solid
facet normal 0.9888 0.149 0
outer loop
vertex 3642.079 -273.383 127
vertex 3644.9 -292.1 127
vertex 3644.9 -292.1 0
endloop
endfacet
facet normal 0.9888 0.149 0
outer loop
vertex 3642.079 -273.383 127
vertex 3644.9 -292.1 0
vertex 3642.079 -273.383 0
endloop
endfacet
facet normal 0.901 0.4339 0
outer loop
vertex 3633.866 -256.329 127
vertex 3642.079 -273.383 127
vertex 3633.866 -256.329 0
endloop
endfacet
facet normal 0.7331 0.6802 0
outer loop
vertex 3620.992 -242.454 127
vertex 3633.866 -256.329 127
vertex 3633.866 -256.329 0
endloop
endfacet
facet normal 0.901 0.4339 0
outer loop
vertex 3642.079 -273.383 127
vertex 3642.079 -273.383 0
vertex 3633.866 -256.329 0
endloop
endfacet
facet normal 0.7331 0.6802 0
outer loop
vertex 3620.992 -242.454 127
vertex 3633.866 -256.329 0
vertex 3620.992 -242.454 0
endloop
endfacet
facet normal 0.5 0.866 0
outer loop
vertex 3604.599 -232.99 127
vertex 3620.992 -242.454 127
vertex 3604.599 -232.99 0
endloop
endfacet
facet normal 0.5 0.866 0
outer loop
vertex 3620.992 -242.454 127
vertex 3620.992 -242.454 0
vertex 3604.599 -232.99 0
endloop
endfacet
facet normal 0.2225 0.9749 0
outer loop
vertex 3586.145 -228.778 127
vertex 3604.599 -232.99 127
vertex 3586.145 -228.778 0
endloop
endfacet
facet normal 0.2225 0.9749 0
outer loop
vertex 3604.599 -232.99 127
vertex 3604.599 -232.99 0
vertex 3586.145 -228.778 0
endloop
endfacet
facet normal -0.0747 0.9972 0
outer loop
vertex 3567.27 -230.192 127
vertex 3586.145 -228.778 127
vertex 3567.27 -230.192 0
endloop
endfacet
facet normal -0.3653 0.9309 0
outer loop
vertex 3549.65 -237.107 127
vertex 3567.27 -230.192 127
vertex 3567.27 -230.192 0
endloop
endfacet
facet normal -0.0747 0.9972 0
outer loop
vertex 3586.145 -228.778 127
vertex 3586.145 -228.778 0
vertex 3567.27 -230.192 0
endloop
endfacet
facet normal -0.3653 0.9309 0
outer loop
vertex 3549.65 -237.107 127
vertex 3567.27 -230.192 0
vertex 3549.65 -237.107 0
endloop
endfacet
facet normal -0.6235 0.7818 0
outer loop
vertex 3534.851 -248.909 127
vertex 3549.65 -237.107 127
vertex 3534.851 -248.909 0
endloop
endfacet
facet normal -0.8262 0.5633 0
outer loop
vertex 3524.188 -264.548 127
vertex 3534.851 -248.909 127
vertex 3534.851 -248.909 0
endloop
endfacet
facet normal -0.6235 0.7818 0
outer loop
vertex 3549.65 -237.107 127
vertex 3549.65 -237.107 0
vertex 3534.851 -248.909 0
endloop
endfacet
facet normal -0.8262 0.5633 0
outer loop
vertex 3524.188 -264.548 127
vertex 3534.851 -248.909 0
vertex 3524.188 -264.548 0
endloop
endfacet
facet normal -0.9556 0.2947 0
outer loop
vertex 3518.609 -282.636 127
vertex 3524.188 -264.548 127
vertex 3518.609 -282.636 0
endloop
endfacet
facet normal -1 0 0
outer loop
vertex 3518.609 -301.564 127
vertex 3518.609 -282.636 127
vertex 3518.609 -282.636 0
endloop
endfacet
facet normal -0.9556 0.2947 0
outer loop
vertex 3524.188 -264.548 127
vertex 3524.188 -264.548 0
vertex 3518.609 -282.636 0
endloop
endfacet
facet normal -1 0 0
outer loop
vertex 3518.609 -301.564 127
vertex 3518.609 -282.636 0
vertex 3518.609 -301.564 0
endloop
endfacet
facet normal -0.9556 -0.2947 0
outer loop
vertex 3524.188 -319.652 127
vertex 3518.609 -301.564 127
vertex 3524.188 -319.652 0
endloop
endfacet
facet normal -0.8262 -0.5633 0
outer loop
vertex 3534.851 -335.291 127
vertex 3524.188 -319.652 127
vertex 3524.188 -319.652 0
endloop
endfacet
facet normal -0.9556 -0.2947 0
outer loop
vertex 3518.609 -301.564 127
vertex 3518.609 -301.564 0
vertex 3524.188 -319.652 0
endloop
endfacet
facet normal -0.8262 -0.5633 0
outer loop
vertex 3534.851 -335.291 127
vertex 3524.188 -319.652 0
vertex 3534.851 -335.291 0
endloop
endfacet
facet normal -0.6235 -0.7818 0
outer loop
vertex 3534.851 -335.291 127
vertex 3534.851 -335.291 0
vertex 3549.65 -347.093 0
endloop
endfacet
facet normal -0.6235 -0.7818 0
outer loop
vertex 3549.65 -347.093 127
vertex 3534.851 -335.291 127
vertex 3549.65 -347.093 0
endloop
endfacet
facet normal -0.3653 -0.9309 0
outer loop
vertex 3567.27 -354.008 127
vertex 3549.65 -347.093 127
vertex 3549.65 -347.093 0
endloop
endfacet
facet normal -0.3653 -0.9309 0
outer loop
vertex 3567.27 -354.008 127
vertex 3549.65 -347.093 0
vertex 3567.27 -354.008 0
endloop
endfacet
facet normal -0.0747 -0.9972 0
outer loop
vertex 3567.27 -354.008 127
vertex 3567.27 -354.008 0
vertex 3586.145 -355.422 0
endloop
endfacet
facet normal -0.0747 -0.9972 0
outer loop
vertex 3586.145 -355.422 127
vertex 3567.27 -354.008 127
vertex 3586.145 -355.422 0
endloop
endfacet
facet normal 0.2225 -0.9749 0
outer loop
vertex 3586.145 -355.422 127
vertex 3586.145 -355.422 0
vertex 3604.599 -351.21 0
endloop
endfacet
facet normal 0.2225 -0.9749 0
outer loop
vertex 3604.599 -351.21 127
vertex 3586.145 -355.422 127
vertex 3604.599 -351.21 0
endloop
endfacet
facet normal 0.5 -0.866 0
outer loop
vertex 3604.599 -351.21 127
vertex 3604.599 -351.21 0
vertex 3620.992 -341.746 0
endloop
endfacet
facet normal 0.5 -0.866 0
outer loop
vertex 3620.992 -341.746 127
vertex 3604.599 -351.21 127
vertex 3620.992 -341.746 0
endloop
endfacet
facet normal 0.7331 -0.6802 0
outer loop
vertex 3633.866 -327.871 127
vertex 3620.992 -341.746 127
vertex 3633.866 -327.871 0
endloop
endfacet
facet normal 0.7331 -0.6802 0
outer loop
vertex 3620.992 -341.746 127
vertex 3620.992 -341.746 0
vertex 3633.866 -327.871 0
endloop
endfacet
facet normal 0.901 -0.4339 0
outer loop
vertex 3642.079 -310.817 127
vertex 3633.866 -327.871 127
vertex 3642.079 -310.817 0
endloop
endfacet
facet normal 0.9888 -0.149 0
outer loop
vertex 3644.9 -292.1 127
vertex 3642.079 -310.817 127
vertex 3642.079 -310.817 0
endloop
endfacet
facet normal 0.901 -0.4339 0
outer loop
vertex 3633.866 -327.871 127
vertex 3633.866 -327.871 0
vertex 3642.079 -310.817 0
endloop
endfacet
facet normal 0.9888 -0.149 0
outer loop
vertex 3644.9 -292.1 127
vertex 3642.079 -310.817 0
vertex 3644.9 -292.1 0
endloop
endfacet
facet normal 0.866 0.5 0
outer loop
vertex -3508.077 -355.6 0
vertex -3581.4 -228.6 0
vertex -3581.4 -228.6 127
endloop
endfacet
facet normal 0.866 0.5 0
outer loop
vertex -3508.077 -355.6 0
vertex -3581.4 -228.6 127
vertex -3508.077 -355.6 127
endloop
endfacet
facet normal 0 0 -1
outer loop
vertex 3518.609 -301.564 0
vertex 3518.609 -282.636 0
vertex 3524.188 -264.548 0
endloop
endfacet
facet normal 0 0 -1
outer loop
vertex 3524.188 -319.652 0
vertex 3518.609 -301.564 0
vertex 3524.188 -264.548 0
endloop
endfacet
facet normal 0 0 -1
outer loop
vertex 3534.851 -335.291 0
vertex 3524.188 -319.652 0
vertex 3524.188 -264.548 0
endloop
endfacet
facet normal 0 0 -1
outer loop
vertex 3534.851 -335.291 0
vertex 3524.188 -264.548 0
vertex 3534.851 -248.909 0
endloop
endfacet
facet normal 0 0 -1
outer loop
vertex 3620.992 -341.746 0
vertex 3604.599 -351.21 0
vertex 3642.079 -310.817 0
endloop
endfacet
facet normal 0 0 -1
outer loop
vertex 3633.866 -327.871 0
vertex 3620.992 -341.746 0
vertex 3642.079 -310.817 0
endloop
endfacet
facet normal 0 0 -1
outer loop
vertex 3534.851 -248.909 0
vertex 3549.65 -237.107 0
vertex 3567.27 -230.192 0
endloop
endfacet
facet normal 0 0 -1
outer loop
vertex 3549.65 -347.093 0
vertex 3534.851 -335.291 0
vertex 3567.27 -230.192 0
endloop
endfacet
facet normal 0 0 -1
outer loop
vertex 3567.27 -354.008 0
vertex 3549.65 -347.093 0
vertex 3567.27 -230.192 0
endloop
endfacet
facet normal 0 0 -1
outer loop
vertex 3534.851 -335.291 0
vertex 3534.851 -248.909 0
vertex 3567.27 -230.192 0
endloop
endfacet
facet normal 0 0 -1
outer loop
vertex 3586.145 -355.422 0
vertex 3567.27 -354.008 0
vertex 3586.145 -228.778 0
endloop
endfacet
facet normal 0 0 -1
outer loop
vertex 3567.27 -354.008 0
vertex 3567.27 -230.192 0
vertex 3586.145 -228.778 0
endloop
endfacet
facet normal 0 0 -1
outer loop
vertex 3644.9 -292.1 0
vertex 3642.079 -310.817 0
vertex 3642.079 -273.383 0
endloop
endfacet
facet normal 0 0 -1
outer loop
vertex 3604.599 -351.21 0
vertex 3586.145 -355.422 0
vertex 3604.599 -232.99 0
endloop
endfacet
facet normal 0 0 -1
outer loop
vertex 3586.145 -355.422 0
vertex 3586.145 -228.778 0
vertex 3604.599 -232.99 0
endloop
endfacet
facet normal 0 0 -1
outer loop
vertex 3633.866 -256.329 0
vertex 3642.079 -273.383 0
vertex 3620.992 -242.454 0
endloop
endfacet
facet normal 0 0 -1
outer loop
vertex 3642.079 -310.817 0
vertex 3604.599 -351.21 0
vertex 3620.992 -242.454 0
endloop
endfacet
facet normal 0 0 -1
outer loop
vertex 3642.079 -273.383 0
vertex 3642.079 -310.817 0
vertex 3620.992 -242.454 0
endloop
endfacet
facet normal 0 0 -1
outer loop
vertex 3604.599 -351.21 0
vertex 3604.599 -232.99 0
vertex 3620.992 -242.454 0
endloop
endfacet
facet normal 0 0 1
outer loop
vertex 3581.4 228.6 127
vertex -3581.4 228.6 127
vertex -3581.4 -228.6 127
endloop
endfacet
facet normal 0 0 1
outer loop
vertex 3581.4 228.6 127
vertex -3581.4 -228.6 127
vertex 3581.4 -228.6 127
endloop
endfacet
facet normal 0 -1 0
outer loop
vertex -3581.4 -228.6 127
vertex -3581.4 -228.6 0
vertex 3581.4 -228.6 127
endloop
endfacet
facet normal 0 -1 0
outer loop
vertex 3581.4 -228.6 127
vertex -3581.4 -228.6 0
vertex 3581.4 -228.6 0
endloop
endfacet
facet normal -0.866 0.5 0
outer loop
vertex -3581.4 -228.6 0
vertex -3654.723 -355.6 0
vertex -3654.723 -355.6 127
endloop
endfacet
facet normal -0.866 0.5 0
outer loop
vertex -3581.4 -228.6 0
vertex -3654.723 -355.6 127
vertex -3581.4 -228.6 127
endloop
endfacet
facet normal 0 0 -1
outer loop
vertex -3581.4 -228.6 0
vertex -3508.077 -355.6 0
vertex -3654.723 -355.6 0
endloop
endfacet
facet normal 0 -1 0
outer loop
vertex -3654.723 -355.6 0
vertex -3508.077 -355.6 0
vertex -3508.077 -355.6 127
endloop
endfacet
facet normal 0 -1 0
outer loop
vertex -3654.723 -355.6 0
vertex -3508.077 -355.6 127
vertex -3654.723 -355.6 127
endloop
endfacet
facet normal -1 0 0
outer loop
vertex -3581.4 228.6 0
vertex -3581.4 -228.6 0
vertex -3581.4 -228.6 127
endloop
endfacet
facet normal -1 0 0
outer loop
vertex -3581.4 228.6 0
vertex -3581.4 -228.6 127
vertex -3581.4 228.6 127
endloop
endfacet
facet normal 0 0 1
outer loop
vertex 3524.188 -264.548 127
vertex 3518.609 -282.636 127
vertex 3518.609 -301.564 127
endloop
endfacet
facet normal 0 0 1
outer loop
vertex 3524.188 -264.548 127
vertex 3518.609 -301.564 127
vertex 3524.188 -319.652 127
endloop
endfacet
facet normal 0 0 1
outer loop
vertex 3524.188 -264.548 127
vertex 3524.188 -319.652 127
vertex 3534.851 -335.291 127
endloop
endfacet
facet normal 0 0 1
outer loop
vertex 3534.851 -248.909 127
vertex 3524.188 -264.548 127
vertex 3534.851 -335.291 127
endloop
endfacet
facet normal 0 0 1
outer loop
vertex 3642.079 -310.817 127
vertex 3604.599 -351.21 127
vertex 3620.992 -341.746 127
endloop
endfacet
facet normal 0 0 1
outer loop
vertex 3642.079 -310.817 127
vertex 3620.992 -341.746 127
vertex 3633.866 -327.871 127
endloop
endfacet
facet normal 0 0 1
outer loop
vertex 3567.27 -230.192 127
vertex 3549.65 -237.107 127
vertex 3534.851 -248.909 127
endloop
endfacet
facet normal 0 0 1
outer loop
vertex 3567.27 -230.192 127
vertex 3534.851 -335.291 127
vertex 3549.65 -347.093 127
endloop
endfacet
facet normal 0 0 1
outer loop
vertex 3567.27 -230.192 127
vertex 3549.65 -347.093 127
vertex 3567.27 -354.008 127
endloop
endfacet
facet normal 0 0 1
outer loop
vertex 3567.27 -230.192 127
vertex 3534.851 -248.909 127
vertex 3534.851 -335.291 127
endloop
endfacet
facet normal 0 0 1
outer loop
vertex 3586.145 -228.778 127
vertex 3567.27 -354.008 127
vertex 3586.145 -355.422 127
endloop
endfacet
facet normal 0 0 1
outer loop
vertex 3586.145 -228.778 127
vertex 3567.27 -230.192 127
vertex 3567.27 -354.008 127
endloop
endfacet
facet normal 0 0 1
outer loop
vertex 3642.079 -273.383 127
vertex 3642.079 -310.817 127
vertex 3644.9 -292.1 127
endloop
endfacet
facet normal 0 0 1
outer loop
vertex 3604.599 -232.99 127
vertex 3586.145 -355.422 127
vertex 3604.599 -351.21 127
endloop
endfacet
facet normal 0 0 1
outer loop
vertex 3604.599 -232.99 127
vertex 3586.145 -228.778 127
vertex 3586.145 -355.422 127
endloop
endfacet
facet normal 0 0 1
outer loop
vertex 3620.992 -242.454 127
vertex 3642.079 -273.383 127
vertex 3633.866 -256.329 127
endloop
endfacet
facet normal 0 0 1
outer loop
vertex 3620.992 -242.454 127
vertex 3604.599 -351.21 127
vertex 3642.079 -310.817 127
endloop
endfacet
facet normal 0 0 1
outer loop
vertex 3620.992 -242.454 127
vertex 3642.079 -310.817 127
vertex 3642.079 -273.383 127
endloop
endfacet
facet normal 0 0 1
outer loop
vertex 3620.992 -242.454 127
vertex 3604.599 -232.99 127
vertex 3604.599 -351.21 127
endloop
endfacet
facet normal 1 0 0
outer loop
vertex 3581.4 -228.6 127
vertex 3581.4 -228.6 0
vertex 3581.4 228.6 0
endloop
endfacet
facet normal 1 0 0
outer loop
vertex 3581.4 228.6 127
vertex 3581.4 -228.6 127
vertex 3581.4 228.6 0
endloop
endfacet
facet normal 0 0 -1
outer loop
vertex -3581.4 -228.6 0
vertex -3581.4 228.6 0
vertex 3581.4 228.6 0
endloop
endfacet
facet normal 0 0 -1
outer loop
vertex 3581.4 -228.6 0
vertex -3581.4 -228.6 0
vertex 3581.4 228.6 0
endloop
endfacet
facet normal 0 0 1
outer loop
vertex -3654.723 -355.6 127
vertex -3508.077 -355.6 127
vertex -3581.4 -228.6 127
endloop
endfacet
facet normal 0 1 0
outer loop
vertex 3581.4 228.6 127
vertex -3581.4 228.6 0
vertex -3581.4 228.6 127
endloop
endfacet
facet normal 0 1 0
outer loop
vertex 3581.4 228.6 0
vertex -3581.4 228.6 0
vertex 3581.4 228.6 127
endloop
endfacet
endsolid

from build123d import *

# Parameters (mm, degrees)
SKETCH1_R             = 63.5
BOSS_EXTRUDE1_DEPTH   = 127
BOSS_EXTRUDE1_2_DEPTH = 127
SKETCH1_W             = 7162.8
SKETCH1_H             = 457.2
BOSS_EXTRUDE1_3_DEPTH = 127


with BuildPart() as part:
    # Sketch1 → Boss-Extrude1 (new body)
    with BuildSketch(Plane.XY):
        with Locations((3581.4, -292.1)):
            Circle(SKETCH1_R)
    extrude(amount=BOSS_EXTRUDE1_DEPTH)


with BuildPart() as body_2:
    # Sketch1 → Boss-Extrude1 2 (new body)
    with BuildSketch(Plane.XY):
        Polygon((-3508.076515813, -355.6), (-3581.4, -228.6), (-3654.723484187, -355.6), align=None)
    extrude(amount=BOSS_EXTRUDE1_2_DEPTH)


with BuildPart() as body_3:
    # Sketch1 → Boss-Extrude1 3 (new body)
    with BuildSketch(Plane.XY):
        Rectangle(SKETCH1_W, SKETCH1_H)
    extrude(amount=BOSS_EXTRUDE1_3_DEPTH)


solid = Compound([part.part, body_2.part, body_3.part])
